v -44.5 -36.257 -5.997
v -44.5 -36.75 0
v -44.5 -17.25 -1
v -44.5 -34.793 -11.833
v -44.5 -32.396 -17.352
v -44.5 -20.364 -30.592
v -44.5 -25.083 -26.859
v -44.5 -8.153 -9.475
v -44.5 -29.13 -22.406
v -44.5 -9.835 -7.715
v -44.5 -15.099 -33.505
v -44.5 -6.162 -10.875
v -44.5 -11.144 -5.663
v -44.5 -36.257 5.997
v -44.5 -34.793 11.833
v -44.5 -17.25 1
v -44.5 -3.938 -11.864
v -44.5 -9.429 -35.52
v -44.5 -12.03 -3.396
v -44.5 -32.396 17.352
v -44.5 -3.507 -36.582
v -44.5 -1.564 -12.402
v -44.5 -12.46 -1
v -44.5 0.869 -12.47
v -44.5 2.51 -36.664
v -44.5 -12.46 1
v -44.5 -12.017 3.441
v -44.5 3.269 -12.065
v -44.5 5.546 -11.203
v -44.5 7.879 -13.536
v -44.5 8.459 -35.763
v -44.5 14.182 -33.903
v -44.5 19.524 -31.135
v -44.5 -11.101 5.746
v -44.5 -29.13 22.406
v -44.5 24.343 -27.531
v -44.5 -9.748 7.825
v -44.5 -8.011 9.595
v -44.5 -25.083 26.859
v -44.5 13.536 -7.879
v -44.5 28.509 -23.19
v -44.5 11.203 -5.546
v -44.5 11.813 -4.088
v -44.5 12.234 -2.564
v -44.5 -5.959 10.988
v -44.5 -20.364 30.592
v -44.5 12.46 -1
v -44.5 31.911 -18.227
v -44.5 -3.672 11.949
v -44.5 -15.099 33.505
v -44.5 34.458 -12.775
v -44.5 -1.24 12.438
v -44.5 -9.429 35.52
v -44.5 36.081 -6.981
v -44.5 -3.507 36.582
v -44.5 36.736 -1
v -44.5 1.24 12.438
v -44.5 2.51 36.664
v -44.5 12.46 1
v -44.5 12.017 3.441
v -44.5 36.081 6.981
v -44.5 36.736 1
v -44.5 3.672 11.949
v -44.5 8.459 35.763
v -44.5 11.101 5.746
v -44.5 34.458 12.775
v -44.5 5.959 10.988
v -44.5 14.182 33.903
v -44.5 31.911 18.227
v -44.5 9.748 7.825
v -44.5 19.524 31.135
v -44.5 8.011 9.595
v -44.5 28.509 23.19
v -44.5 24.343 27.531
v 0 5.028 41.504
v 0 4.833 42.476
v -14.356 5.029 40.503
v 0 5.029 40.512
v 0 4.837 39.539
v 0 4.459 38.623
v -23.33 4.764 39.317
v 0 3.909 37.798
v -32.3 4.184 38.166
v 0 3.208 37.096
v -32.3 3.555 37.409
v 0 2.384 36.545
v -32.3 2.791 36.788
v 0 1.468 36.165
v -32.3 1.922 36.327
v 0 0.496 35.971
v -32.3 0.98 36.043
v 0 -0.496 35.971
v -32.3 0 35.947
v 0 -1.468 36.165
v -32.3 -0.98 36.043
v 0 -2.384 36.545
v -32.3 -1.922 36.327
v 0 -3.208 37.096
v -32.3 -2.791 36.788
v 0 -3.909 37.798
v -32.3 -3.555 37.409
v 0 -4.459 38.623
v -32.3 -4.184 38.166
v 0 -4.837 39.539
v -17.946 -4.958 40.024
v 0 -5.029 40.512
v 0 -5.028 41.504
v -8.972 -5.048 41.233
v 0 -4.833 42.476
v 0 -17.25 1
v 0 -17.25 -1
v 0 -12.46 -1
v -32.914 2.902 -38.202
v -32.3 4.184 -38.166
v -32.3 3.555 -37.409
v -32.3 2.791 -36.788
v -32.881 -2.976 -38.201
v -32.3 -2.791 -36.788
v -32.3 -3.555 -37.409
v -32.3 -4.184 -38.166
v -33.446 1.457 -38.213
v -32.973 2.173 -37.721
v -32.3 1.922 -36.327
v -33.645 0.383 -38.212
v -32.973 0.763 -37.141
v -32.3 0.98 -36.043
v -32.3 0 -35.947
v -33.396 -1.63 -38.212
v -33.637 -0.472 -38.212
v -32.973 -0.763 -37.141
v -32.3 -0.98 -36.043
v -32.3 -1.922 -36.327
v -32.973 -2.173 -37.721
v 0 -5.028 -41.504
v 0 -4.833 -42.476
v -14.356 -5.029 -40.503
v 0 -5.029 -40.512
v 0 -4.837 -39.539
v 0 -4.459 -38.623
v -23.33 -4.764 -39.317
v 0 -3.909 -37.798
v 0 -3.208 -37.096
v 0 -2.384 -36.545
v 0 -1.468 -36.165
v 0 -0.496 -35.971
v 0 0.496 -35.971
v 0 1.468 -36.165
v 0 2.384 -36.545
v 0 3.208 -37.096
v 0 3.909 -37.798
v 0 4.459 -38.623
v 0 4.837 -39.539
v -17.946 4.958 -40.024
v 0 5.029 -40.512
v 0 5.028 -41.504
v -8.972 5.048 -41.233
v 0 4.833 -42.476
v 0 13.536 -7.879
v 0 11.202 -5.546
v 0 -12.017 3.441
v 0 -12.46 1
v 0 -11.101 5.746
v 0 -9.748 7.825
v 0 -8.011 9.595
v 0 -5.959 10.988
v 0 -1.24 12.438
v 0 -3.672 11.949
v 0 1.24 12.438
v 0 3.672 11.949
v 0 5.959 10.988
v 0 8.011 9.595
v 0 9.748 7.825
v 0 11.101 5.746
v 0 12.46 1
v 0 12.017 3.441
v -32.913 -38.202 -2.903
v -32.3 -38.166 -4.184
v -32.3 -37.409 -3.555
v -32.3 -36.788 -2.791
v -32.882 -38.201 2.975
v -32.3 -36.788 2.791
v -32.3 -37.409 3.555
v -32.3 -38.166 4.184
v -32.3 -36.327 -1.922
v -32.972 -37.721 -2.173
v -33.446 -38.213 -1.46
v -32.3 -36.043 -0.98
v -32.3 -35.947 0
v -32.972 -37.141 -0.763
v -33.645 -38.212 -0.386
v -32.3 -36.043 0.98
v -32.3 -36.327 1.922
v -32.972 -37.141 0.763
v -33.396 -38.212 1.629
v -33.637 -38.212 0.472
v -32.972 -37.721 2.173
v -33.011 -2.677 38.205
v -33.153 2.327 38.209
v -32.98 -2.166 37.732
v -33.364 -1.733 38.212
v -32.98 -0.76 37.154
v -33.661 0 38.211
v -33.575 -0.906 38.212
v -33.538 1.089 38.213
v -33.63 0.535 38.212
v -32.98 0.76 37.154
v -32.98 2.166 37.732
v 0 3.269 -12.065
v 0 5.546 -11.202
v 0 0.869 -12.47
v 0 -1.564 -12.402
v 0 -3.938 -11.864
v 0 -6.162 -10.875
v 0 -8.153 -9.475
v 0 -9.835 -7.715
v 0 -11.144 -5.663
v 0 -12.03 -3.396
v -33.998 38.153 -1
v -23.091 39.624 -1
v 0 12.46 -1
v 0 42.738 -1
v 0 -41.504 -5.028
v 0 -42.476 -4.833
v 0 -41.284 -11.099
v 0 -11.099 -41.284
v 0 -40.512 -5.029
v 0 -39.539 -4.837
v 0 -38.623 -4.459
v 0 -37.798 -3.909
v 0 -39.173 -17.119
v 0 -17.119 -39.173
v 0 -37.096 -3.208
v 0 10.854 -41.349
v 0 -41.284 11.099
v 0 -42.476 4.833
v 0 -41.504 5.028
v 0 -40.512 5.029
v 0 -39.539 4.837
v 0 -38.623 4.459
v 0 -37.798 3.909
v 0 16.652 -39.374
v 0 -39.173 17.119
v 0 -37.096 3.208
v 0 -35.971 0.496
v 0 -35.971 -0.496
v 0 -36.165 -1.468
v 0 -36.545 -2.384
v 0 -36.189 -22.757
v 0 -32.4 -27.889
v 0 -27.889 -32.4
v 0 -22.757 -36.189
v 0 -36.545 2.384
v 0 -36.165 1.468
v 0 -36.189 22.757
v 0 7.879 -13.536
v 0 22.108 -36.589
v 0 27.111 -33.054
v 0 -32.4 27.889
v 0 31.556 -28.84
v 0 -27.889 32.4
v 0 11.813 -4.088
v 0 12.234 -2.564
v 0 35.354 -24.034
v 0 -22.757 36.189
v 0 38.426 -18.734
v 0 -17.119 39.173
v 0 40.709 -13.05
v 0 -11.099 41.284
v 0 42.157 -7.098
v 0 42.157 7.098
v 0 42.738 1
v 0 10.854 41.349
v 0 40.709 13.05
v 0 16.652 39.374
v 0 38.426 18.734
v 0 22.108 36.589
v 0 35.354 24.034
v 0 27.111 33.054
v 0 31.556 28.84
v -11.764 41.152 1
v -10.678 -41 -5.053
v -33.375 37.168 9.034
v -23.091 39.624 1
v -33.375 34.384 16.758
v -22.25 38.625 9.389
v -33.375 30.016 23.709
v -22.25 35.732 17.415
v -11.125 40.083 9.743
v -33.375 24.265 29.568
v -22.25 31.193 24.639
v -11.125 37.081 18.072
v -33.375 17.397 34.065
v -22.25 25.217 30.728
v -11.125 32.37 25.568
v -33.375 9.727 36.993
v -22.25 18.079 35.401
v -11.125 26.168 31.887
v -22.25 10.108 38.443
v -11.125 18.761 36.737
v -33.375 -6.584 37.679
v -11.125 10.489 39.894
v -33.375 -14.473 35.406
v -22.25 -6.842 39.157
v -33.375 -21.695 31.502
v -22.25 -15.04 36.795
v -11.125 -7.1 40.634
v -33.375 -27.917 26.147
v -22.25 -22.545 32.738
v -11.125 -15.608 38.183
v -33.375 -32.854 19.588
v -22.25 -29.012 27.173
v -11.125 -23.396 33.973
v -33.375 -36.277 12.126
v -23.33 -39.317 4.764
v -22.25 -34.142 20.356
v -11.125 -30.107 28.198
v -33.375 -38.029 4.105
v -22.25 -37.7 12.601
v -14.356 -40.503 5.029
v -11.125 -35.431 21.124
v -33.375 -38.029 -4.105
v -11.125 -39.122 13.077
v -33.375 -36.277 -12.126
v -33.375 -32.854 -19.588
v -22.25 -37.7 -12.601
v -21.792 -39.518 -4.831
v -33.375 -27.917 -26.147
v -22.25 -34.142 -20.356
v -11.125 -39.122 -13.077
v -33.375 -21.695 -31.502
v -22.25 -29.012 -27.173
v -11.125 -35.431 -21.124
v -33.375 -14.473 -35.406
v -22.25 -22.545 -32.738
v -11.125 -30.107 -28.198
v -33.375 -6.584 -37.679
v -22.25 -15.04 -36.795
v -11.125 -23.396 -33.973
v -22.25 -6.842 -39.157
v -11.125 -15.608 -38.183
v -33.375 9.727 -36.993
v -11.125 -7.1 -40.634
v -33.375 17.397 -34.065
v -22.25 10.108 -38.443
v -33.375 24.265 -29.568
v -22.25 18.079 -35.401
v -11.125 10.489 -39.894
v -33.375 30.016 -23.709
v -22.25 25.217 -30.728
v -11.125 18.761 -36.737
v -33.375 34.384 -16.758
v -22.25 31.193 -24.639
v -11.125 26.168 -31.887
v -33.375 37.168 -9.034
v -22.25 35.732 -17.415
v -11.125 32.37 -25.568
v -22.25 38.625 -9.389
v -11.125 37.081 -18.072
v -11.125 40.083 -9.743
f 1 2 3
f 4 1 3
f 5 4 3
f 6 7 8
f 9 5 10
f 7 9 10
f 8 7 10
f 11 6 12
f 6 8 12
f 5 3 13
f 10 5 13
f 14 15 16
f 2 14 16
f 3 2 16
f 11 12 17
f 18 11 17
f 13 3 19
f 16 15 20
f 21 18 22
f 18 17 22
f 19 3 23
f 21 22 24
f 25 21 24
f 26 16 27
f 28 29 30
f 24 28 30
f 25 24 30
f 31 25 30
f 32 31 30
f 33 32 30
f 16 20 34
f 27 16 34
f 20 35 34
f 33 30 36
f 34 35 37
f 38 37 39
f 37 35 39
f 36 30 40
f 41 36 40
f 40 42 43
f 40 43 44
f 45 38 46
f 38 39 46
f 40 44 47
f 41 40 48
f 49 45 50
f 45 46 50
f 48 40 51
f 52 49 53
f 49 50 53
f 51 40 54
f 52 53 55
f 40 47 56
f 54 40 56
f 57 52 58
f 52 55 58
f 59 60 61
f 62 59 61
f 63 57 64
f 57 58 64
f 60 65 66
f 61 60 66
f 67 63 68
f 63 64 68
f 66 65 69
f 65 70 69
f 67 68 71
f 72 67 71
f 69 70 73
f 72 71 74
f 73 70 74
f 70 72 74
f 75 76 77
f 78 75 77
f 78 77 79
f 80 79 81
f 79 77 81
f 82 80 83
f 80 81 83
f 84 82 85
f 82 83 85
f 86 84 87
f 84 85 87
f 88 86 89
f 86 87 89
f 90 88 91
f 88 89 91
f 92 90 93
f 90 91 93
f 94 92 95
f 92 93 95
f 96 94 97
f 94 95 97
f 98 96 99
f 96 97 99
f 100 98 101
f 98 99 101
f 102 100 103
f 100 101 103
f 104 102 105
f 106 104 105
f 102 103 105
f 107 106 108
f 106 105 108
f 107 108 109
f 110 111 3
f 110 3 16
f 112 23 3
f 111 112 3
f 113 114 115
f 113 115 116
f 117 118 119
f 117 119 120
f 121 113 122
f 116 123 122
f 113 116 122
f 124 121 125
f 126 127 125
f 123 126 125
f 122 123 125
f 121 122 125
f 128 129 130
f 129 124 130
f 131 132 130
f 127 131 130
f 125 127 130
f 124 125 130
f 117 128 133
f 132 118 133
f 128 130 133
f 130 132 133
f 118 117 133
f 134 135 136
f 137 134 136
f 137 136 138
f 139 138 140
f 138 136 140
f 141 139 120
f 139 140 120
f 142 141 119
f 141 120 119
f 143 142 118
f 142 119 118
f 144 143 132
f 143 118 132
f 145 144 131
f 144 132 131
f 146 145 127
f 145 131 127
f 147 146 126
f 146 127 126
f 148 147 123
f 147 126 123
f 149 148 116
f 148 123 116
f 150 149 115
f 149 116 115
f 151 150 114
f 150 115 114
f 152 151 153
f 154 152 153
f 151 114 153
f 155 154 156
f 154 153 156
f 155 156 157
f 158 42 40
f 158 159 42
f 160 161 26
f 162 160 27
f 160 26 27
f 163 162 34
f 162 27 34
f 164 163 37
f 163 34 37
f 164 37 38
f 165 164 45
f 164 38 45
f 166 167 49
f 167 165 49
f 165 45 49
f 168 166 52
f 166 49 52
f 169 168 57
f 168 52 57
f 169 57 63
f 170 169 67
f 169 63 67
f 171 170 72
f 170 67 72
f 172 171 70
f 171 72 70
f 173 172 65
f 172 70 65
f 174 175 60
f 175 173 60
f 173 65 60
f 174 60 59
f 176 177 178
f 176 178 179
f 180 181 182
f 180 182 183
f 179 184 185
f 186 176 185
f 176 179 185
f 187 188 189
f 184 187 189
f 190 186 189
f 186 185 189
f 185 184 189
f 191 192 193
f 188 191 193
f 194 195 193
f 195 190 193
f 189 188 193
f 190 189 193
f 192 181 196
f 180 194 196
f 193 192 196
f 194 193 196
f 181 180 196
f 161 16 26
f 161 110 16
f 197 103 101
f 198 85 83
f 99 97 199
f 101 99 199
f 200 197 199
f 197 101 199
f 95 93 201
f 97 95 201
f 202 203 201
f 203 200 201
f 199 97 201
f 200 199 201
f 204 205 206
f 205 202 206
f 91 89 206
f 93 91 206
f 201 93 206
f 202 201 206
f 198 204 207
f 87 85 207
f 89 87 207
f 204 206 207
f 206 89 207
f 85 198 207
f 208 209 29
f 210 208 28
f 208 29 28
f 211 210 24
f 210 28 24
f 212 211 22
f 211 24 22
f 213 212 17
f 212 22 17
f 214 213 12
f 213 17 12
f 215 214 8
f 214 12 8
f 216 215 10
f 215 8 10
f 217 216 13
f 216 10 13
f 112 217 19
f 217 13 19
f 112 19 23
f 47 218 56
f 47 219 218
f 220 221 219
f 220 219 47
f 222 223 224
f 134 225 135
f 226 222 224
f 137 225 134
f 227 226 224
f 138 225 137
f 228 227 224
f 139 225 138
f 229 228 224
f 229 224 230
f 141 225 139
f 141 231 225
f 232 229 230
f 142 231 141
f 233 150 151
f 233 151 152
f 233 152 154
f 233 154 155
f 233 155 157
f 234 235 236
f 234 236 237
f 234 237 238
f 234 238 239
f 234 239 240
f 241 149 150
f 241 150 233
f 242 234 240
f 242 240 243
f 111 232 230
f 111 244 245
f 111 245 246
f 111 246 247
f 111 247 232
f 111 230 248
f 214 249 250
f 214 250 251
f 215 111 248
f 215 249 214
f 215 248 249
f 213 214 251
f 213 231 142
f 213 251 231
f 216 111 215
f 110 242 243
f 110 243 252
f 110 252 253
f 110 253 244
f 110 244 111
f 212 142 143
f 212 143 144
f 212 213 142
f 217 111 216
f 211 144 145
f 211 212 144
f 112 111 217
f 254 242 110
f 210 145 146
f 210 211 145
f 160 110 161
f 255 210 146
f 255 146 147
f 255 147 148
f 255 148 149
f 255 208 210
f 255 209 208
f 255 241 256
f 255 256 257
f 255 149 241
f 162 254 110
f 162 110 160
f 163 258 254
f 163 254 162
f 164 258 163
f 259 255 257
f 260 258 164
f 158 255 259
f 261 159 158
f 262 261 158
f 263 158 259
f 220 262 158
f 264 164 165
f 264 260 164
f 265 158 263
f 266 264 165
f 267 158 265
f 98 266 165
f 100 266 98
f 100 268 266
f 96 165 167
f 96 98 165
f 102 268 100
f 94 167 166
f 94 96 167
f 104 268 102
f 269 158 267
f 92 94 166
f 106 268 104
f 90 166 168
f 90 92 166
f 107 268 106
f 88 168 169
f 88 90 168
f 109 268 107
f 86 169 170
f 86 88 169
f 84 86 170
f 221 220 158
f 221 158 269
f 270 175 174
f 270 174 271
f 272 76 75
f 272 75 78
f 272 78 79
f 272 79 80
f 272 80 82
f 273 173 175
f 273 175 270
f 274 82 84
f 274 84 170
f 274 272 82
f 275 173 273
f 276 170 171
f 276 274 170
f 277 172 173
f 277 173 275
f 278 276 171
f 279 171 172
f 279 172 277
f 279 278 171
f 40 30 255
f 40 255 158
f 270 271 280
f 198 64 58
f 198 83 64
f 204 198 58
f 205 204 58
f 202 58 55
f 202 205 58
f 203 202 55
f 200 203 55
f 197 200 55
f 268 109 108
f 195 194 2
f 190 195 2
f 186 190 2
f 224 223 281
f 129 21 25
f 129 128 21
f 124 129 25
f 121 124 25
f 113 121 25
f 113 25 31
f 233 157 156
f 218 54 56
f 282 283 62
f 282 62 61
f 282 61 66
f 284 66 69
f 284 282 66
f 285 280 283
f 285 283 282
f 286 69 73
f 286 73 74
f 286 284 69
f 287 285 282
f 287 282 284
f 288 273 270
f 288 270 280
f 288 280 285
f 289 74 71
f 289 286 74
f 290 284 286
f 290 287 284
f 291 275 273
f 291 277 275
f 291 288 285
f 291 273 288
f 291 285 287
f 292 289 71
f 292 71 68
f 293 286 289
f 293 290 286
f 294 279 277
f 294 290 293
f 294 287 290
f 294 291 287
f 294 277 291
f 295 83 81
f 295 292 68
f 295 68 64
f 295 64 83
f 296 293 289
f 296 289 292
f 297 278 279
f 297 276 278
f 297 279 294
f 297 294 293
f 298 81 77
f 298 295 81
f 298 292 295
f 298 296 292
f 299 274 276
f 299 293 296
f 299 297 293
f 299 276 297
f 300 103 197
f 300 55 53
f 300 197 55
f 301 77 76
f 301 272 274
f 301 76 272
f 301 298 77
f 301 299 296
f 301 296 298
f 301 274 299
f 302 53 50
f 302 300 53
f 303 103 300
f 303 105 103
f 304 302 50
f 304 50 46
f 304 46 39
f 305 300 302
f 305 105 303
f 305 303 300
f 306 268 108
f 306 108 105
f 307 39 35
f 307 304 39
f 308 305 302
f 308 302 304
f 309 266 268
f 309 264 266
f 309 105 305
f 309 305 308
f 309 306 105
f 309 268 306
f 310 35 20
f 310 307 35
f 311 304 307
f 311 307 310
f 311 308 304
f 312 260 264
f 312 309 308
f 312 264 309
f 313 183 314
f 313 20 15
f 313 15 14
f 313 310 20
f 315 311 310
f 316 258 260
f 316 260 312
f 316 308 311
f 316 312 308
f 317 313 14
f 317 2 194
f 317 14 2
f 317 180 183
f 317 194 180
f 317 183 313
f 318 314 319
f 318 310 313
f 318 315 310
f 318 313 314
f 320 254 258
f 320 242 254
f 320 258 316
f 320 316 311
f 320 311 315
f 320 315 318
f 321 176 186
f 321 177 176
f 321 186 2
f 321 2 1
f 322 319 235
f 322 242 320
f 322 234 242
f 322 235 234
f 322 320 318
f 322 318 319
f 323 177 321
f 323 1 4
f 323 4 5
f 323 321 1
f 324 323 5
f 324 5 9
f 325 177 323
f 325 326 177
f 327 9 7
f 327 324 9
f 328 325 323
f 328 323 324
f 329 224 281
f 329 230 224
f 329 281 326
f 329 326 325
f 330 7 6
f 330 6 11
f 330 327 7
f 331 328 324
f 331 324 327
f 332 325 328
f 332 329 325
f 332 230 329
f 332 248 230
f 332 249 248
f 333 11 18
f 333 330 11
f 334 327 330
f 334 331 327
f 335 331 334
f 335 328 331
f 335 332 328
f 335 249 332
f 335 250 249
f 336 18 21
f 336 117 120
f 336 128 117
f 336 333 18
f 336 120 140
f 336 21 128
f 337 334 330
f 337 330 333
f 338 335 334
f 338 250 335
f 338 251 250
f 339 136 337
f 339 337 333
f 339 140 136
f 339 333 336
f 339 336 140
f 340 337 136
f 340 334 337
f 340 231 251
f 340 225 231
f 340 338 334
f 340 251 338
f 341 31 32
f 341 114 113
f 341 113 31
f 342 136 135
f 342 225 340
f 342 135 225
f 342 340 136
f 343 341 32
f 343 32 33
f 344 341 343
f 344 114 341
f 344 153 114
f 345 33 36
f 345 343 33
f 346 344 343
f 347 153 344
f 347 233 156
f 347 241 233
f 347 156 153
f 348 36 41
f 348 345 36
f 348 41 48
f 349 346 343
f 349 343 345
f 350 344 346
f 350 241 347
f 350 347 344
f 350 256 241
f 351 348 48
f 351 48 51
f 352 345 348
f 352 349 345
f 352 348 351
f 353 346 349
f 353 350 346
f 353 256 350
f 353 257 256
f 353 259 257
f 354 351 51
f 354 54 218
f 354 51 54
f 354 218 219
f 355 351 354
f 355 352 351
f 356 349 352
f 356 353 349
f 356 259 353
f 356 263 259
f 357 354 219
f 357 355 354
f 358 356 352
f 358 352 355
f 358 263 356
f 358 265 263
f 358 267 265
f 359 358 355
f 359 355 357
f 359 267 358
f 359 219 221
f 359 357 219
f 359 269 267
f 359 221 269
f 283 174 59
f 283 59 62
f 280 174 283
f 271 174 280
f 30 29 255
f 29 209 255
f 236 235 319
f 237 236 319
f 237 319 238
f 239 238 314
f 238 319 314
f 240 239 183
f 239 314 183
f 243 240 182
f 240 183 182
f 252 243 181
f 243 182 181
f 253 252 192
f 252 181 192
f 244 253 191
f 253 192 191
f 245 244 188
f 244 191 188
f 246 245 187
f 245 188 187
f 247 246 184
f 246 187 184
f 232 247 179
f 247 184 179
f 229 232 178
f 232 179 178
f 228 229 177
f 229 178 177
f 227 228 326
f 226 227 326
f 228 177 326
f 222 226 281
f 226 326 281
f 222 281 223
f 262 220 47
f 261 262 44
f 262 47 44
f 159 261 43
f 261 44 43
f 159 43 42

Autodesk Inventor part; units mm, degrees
ref_plane "YZ Plane" through (0, 0, 0) normal (1, 0, 0) x (0, 1, 0)
ref_plane "XZ Plane" through (0, 0, 0) normal (0, 1, 0) x (-1, 0, 0)
ref_plane "XY Plane" through (0, 0, 0) normal (0, 0, 1) x (1, 0, 0)
sketch "Esquisse1" plane through (0, 0, 0) normal (0, 0, 1) x (1, 0, 0)
  line L0 (-36.1898, 0) -> (37.2521, 0)
  line L1 (0, 12.5) -> (-44.5, 12.5)
  line L2 (-44.5, 12.5) -> (-44.5, 36.75)
  line L3 (-44.5, 36.75) -> (0, 42.75)
  line L4 (0, 42.75) -> (0, 12.5)
  point P0 (0, 0)
  dimension "d0" = 25
  dimension "d1" = 85.5
  dimension "d2" = 0
  dimension "d3" = 73.5
  dimension "d4" = 44.5
  dimension "d5" = 0
revolve "Révolution1" add sketch "Esquisse1" angle 360 about axis through (-36.1898, 0, 0) along (1, 0, 0)
sketch "Esquisse3" plane through (0, 0, 0) normal (1, 0, 0) x (0, 0, -1)
  circle A0 centre (0, 0) radius 41
  circle A1 centre (0, 0) radius 12.5 projected
  line L0 (0, 0) -> (-59.2945, 0)
  line L1 (0, 0) -> (0, -53.2291)
  line L2 (0, 0) -> (55.0659, 0)
  point P0 (0, -41)
  point P1 (41, 0)
  point P2 (-41, 0)
  dimension "d16" = 82
hole "Perçage1" at (0, -41, 0) at (0, 0, 41) at (0, 0, -41) direction (-1, 0, 0) diameter 10.106 depth 32.3 tip angle 118 thread size "M12x1.75" class "6H" standard "ANSI Metric M Profile"
sketch "Esquisse4" plane through (0, 0, 0) normal (1, 0, 0) x (0, 0, 1)
  line L0 (0, 0) -> (-39.036, -39.036)
  line L1 (0, 0) -> (-55.3193, 0)
  circle A0 centre (0, 0) radius 12.5 projected
  line L2 (-5.5456, -11.2025) -> (-7.8791, -13.5359)
  line L3 (-11.2025, -5.5456) -> (-13.5359, -7.8791)
  line L4 (-13.5359, -7.8791) -> (-7.8791, -13.5359)
  dimension "d17" = 45
  dimension "d20" = 3.3
  dimension "d21" = 3.3
  dimension "d22" = 4
  dimension "d23" = 4
extrude "Extrusion1" cut sketch "Esquisse4" against normal through all contours A0 L2 L4 L0 | L0 L4 L3 A0
sketch "Esquisse5" plane through (0, 0, 0) normal (1, 0, 0) x (0, 0, 1)
  line L0 (-1, 17.25) -> (1, 17.25)
  line L1 (1, 17.25) -> (1, -42.75)
  line L2 (1, -42.75) -> (-1, -42.75)
  line L3 (-1, -42.75) -> (-1, 17.25)
  line L4 (-1, 17.25) -> (1, -42.75) construction
  line L5 (1, 17.25) -> (-1, -42.75) construction
  arc A0 (-4.8326, 42.476) -> (4.8326, 42.476) centre (0, 0) ccw projected
  point P0 (0, -12.75)
  point P1 (42.6948, 2.1722)
  point P2 (-42.6948, 2.1722)
  point P3 (4.9266, -42.4652)
  point P4 (42.5102, -4.5219)
  dimension "d26" = 2
  dimension "d27" = 60
  dimension "d28" = 0
extrude "Extrusion2" cut sketch "Esquisse5" against normal through all
properties part number "Douille2517"
